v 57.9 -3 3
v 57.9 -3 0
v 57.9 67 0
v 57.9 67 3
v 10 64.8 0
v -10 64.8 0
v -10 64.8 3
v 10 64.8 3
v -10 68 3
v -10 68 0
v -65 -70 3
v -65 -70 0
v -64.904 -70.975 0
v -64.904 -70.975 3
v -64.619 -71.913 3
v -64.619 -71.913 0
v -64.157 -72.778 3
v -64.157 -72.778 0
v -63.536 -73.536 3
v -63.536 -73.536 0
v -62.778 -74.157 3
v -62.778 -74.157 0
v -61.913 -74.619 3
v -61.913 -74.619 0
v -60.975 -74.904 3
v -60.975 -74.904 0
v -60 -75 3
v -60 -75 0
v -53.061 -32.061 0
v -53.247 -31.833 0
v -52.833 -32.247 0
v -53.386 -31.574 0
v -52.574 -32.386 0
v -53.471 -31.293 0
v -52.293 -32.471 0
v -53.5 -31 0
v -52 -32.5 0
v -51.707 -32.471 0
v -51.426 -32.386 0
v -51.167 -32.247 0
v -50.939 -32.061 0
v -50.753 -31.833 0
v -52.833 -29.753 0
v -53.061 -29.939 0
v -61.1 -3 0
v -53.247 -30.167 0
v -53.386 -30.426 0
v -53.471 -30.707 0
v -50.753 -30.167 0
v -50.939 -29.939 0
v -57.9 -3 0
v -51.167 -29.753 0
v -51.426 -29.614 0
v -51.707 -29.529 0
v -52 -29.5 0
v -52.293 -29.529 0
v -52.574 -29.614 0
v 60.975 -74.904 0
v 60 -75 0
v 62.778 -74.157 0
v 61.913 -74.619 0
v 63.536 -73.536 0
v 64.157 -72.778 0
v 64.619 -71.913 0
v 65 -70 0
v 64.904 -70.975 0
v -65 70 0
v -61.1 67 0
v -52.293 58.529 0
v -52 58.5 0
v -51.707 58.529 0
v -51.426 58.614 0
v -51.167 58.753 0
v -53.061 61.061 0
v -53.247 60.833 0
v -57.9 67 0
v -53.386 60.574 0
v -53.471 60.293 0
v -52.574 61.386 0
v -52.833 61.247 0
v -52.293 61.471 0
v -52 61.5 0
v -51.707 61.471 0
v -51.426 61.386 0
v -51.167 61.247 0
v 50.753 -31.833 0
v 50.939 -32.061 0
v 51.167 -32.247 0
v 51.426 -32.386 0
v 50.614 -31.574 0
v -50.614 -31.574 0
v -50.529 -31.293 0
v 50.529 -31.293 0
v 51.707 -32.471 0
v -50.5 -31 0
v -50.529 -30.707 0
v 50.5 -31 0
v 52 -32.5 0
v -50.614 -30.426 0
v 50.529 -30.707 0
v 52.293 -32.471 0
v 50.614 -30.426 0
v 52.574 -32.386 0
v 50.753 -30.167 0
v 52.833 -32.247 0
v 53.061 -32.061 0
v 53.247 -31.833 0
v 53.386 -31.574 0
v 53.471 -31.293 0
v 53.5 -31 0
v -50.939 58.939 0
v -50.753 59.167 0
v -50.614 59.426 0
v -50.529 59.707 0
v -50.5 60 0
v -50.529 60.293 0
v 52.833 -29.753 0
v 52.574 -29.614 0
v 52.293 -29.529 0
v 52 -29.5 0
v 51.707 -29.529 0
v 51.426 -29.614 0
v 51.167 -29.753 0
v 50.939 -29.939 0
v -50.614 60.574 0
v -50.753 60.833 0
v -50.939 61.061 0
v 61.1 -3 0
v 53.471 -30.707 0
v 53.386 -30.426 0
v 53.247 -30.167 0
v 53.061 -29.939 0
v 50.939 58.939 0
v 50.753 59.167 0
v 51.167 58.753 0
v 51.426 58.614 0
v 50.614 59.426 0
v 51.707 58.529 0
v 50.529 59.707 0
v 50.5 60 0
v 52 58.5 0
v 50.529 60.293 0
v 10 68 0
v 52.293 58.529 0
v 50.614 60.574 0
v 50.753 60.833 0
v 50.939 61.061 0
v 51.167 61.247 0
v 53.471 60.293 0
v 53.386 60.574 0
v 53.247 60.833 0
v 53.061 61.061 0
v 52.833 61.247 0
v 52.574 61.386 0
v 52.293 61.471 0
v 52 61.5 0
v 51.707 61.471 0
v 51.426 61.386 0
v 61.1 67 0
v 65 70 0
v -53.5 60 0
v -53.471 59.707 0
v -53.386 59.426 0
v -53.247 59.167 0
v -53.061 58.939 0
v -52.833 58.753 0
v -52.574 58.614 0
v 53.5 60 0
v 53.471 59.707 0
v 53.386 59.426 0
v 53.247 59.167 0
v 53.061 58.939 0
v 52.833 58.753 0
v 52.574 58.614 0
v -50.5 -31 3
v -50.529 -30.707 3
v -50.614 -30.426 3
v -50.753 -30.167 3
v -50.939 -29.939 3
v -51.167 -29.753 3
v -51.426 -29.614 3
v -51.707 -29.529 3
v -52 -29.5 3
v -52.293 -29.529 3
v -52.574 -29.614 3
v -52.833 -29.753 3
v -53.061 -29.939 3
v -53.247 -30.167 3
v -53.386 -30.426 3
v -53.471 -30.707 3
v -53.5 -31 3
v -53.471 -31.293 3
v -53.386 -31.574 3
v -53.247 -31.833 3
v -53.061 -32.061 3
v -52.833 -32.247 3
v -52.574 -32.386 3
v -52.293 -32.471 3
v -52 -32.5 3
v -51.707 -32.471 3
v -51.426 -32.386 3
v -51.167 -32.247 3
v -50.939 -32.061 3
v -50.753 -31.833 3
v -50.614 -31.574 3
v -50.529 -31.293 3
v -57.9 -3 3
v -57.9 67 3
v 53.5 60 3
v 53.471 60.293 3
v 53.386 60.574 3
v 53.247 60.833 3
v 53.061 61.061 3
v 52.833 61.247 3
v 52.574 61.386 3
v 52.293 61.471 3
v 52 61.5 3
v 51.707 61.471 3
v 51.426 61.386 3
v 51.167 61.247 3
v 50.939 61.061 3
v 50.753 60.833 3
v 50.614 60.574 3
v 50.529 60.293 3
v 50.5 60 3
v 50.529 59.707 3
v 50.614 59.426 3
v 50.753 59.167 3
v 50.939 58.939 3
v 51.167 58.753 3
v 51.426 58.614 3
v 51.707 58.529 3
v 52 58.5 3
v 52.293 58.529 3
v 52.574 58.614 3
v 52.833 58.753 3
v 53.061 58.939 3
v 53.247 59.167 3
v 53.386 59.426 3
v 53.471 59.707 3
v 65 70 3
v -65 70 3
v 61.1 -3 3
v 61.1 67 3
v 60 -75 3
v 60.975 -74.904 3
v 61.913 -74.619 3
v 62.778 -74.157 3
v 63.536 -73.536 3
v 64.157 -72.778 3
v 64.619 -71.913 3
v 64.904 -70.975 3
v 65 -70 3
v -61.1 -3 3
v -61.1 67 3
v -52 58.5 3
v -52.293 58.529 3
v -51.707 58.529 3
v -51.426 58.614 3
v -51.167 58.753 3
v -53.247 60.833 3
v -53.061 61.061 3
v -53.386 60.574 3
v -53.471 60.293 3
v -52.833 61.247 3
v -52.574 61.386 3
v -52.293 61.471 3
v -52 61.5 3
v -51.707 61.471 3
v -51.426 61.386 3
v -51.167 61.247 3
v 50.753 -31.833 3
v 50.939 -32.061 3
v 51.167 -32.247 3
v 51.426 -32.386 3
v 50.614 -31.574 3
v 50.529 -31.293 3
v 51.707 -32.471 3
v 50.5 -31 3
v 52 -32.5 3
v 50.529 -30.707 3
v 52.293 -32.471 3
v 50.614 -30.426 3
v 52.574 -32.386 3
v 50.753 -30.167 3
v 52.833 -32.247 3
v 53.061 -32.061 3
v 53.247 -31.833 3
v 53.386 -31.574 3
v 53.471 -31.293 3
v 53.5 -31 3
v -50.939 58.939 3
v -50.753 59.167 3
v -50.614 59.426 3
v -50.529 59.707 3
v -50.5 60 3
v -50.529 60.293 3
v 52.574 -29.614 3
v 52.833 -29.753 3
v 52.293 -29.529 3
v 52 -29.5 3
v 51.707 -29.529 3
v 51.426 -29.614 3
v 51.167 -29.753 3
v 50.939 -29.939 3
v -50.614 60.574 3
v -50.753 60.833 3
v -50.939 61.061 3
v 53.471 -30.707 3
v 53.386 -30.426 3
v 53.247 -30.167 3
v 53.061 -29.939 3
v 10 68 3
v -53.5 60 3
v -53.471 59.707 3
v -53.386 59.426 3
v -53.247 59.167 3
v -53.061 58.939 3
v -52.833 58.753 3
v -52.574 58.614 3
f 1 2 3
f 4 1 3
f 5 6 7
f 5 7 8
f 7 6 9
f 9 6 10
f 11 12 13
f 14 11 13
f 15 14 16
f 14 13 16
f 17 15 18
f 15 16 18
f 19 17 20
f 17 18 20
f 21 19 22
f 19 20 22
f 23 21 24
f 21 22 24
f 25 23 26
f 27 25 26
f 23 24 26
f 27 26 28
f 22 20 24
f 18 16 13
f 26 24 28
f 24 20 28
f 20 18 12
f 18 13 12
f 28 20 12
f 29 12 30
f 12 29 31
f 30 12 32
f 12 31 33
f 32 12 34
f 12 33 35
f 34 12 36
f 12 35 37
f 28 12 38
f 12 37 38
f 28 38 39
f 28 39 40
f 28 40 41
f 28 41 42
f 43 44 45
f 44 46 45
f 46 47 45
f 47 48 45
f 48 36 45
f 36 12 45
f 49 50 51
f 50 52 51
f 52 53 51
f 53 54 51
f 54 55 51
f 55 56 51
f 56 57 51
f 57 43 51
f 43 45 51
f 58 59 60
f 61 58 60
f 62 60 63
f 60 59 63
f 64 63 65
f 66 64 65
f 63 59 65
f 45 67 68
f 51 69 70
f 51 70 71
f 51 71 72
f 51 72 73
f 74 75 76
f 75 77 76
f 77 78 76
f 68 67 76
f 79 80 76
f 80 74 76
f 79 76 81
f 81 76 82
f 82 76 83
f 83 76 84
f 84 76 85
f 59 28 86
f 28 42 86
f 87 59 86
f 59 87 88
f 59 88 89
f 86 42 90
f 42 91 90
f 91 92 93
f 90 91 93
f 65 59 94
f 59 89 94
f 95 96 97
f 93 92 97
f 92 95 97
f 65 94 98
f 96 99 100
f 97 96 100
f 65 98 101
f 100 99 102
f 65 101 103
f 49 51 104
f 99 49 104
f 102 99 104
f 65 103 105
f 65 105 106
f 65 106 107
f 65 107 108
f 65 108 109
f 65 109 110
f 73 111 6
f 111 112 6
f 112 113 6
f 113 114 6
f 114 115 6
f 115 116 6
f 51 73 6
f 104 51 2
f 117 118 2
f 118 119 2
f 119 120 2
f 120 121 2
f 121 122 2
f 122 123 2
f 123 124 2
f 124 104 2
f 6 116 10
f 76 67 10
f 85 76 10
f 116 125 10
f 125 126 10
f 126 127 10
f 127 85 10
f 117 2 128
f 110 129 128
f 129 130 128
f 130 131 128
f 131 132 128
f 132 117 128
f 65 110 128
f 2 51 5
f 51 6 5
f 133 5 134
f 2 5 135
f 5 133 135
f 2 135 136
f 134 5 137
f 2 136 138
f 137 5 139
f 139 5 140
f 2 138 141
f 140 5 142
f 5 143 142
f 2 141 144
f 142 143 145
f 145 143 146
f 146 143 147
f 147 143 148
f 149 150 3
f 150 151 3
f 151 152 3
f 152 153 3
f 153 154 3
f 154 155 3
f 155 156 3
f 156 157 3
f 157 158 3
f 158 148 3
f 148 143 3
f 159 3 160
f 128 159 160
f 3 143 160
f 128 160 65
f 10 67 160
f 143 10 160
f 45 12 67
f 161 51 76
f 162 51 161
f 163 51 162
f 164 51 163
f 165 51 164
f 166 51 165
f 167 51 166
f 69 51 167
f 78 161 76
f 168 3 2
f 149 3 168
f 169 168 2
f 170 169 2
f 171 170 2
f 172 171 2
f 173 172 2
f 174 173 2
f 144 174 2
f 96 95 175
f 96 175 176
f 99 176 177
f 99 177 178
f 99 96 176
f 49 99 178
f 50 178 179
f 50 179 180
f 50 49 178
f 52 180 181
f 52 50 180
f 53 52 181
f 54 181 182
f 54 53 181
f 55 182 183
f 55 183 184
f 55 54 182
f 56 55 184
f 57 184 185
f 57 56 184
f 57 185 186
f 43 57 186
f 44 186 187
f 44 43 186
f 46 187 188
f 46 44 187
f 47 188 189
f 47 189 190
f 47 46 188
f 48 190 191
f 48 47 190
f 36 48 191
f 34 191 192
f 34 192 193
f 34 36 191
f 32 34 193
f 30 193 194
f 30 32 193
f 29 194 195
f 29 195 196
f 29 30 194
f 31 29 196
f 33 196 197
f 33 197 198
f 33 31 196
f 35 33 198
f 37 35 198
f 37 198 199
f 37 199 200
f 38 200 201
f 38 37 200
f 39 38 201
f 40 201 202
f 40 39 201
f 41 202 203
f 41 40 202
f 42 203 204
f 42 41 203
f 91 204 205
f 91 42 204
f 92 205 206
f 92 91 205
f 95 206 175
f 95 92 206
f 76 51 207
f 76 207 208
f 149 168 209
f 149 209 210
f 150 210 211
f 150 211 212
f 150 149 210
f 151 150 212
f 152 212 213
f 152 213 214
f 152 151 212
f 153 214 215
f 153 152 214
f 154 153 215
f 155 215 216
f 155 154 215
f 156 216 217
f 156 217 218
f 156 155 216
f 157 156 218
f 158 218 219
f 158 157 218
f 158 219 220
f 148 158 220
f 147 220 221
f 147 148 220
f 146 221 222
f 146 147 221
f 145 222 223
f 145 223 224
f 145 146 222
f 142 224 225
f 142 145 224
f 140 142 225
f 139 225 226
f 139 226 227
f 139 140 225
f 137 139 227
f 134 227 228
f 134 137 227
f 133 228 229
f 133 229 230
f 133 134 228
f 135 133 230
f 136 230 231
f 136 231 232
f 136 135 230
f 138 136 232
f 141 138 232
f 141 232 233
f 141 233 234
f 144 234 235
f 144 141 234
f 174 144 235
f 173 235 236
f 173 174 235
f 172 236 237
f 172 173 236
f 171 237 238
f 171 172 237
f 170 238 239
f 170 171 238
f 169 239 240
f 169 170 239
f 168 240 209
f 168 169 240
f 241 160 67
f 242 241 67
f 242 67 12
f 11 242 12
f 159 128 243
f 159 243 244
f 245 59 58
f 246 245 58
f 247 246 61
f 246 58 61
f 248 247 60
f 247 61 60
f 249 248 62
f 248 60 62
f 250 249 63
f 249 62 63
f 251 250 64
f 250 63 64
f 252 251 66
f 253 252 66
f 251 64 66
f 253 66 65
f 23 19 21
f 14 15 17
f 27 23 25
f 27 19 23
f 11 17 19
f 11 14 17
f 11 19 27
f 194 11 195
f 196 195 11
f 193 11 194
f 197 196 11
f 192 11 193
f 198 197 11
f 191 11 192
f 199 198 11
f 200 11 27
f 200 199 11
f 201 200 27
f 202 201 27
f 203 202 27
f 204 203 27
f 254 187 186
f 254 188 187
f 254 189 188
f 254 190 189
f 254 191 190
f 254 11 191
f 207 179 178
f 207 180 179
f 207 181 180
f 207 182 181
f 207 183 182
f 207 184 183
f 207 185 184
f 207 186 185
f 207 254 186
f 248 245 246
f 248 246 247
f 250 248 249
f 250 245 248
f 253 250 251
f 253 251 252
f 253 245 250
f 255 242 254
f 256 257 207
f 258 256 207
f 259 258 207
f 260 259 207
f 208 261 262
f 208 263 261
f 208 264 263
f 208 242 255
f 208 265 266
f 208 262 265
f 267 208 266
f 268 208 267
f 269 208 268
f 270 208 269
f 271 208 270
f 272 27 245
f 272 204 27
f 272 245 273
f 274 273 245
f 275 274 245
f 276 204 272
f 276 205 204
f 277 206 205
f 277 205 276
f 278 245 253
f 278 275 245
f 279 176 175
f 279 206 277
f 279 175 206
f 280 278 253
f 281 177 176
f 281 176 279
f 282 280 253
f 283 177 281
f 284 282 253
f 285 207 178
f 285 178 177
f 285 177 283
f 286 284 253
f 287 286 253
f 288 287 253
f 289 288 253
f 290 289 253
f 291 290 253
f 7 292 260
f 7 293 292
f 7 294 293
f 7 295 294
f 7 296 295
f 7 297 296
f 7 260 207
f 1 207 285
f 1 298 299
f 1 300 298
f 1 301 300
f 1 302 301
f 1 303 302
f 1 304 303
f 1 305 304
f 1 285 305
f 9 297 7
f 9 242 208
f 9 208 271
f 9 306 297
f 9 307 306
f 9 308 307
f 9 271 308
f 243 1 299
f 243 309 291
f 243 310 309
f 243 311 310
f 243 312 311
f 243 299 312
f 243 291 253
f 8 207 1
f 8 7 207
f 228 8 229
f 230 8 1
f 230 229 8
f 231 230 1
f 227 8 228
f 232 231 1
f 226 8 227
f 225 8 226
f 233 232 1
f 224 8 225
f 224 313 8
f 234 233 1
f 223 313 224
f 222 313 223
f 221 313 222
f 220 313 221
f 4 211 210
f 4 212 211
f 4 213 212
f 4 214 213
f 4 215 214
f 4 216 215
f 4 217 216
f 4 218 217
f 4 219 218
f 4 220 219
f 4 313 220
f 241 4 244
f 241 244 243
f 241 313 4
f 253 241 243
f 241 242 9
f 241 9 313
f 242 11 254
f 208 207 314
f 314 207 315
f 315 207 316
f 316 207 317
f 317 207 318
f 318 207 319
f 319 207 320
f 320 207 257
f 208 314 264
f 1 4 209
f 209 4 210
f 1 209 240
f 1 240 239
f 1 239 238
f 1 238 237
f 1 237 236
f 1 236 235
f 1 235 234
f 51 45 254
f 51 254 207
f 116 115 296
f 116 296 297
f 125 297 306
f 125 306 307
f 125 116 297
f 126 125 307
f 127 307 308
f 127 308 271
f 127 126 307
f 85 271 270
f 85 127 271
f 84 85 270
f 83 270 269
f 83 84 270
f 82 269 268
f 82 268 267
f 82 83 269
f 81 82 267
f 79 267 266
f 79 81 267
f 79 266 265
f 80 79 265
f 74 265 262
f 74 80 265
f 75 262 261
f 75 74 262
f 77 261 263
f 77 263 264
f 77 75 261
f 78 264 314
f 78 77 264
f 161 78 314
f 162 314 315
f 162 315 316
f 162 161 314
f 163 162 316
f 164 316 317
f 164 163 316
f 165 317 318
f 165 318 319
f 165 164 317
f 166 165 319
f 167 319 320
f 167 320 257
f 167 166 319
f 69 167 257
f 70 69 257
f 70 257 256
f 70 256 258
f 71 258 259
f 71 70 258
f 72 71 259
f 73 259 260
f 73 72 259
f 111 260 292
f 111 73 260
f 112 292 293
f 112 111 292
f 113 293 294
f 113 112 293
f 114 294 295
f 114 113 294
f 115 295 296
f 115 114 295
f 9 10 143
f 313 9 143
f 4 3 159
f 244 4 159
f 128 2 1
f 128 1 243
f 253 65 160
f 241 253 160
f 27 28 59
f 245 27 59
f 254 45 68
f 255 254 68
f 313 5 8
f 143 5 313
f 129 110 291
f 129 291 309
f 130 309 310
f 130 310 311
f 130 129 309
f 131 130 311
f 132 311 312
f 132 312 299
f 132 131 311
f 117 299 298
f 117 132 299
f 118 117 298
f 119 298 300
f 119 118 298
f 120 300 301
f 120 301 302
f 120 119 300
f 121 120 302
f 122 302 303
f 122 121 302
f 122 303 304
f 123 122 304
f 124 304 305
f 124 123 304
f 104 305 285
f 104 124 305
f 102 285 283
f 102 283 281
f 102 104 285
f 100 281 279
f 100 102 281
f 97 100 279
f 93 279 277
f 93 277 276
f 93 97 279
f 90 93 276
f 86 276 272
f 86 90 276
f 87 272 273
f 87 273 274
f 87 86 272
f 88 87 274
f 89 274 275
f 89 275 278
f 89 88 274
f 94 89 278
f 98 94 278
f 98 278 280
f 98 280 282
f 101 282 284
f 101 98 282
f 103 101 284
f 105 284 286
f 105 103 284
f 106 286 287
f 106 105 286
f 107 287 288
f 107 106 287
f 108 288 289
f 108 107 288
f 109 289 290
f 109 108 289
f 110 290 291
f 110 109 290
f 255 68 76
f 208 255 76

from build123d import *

# Parameters (mm, degrees)
SKETCH1_R           = 1.5
SKETCH1_W           = 20
SKETCH1_H           = 3.2
SKETCH1_W_2         = 3.2
SKETCH1_H_2         = 70
BOSS_EXTRUDE1_DEPTH = 3


with BuildPart() as part:
    # Sketch1 → Boss-Extrude1 (new body)
    with BuildSketch(Plane.XY):
        with BuildLine():
            Line((-60, -75), (60, -75))
            ThreePointArc((60, -75), (63.535533906, -73.535533906), (65, -70))
            Line((65, -70), (65, 70))
            Line((65, 70), (-65, 70))
            Line((-65, 70), (-65, -70))
            ThreePointArc((-65, -70), (-63.535533906, -73.535533906), (-60, -75))
        make_face()
        with Locations((-52, -31)):
            Circle(SKETCH1_R, mode=Mode.SUBTRACT)
        with Locations((52, -31)):
            Circle(SKETCH1_R, mode=Mode.SUBTRACT)
        with Locations((52, 60)):
            Circle(SKETCH1_R, mode=Mode.SUBTRACT)
        with Locations((-52, 60)):
            Circle(SKETCH1_R, mode=Mode.SUBTRACT)
        with Locations((0, 66.4)):
            Rectangle(SKETCH1_W, SKETCH1_H, mode=Mode.SUBTRACT)
        with Locations((-59.5, 32)):
            Rectangle(SKETCH1_W_2, SKETCH1_H_2, mode=Mode.SUBTRACT)
        with Locations((59.5, 32)):
            Rectangle(SKETCH1_W_2, SKETCH1_H_2, mode=Mode.SUBTRACT)
    extrude(amount=BOSS_EXTRUDE1_DEPTH)


solid = part.part
